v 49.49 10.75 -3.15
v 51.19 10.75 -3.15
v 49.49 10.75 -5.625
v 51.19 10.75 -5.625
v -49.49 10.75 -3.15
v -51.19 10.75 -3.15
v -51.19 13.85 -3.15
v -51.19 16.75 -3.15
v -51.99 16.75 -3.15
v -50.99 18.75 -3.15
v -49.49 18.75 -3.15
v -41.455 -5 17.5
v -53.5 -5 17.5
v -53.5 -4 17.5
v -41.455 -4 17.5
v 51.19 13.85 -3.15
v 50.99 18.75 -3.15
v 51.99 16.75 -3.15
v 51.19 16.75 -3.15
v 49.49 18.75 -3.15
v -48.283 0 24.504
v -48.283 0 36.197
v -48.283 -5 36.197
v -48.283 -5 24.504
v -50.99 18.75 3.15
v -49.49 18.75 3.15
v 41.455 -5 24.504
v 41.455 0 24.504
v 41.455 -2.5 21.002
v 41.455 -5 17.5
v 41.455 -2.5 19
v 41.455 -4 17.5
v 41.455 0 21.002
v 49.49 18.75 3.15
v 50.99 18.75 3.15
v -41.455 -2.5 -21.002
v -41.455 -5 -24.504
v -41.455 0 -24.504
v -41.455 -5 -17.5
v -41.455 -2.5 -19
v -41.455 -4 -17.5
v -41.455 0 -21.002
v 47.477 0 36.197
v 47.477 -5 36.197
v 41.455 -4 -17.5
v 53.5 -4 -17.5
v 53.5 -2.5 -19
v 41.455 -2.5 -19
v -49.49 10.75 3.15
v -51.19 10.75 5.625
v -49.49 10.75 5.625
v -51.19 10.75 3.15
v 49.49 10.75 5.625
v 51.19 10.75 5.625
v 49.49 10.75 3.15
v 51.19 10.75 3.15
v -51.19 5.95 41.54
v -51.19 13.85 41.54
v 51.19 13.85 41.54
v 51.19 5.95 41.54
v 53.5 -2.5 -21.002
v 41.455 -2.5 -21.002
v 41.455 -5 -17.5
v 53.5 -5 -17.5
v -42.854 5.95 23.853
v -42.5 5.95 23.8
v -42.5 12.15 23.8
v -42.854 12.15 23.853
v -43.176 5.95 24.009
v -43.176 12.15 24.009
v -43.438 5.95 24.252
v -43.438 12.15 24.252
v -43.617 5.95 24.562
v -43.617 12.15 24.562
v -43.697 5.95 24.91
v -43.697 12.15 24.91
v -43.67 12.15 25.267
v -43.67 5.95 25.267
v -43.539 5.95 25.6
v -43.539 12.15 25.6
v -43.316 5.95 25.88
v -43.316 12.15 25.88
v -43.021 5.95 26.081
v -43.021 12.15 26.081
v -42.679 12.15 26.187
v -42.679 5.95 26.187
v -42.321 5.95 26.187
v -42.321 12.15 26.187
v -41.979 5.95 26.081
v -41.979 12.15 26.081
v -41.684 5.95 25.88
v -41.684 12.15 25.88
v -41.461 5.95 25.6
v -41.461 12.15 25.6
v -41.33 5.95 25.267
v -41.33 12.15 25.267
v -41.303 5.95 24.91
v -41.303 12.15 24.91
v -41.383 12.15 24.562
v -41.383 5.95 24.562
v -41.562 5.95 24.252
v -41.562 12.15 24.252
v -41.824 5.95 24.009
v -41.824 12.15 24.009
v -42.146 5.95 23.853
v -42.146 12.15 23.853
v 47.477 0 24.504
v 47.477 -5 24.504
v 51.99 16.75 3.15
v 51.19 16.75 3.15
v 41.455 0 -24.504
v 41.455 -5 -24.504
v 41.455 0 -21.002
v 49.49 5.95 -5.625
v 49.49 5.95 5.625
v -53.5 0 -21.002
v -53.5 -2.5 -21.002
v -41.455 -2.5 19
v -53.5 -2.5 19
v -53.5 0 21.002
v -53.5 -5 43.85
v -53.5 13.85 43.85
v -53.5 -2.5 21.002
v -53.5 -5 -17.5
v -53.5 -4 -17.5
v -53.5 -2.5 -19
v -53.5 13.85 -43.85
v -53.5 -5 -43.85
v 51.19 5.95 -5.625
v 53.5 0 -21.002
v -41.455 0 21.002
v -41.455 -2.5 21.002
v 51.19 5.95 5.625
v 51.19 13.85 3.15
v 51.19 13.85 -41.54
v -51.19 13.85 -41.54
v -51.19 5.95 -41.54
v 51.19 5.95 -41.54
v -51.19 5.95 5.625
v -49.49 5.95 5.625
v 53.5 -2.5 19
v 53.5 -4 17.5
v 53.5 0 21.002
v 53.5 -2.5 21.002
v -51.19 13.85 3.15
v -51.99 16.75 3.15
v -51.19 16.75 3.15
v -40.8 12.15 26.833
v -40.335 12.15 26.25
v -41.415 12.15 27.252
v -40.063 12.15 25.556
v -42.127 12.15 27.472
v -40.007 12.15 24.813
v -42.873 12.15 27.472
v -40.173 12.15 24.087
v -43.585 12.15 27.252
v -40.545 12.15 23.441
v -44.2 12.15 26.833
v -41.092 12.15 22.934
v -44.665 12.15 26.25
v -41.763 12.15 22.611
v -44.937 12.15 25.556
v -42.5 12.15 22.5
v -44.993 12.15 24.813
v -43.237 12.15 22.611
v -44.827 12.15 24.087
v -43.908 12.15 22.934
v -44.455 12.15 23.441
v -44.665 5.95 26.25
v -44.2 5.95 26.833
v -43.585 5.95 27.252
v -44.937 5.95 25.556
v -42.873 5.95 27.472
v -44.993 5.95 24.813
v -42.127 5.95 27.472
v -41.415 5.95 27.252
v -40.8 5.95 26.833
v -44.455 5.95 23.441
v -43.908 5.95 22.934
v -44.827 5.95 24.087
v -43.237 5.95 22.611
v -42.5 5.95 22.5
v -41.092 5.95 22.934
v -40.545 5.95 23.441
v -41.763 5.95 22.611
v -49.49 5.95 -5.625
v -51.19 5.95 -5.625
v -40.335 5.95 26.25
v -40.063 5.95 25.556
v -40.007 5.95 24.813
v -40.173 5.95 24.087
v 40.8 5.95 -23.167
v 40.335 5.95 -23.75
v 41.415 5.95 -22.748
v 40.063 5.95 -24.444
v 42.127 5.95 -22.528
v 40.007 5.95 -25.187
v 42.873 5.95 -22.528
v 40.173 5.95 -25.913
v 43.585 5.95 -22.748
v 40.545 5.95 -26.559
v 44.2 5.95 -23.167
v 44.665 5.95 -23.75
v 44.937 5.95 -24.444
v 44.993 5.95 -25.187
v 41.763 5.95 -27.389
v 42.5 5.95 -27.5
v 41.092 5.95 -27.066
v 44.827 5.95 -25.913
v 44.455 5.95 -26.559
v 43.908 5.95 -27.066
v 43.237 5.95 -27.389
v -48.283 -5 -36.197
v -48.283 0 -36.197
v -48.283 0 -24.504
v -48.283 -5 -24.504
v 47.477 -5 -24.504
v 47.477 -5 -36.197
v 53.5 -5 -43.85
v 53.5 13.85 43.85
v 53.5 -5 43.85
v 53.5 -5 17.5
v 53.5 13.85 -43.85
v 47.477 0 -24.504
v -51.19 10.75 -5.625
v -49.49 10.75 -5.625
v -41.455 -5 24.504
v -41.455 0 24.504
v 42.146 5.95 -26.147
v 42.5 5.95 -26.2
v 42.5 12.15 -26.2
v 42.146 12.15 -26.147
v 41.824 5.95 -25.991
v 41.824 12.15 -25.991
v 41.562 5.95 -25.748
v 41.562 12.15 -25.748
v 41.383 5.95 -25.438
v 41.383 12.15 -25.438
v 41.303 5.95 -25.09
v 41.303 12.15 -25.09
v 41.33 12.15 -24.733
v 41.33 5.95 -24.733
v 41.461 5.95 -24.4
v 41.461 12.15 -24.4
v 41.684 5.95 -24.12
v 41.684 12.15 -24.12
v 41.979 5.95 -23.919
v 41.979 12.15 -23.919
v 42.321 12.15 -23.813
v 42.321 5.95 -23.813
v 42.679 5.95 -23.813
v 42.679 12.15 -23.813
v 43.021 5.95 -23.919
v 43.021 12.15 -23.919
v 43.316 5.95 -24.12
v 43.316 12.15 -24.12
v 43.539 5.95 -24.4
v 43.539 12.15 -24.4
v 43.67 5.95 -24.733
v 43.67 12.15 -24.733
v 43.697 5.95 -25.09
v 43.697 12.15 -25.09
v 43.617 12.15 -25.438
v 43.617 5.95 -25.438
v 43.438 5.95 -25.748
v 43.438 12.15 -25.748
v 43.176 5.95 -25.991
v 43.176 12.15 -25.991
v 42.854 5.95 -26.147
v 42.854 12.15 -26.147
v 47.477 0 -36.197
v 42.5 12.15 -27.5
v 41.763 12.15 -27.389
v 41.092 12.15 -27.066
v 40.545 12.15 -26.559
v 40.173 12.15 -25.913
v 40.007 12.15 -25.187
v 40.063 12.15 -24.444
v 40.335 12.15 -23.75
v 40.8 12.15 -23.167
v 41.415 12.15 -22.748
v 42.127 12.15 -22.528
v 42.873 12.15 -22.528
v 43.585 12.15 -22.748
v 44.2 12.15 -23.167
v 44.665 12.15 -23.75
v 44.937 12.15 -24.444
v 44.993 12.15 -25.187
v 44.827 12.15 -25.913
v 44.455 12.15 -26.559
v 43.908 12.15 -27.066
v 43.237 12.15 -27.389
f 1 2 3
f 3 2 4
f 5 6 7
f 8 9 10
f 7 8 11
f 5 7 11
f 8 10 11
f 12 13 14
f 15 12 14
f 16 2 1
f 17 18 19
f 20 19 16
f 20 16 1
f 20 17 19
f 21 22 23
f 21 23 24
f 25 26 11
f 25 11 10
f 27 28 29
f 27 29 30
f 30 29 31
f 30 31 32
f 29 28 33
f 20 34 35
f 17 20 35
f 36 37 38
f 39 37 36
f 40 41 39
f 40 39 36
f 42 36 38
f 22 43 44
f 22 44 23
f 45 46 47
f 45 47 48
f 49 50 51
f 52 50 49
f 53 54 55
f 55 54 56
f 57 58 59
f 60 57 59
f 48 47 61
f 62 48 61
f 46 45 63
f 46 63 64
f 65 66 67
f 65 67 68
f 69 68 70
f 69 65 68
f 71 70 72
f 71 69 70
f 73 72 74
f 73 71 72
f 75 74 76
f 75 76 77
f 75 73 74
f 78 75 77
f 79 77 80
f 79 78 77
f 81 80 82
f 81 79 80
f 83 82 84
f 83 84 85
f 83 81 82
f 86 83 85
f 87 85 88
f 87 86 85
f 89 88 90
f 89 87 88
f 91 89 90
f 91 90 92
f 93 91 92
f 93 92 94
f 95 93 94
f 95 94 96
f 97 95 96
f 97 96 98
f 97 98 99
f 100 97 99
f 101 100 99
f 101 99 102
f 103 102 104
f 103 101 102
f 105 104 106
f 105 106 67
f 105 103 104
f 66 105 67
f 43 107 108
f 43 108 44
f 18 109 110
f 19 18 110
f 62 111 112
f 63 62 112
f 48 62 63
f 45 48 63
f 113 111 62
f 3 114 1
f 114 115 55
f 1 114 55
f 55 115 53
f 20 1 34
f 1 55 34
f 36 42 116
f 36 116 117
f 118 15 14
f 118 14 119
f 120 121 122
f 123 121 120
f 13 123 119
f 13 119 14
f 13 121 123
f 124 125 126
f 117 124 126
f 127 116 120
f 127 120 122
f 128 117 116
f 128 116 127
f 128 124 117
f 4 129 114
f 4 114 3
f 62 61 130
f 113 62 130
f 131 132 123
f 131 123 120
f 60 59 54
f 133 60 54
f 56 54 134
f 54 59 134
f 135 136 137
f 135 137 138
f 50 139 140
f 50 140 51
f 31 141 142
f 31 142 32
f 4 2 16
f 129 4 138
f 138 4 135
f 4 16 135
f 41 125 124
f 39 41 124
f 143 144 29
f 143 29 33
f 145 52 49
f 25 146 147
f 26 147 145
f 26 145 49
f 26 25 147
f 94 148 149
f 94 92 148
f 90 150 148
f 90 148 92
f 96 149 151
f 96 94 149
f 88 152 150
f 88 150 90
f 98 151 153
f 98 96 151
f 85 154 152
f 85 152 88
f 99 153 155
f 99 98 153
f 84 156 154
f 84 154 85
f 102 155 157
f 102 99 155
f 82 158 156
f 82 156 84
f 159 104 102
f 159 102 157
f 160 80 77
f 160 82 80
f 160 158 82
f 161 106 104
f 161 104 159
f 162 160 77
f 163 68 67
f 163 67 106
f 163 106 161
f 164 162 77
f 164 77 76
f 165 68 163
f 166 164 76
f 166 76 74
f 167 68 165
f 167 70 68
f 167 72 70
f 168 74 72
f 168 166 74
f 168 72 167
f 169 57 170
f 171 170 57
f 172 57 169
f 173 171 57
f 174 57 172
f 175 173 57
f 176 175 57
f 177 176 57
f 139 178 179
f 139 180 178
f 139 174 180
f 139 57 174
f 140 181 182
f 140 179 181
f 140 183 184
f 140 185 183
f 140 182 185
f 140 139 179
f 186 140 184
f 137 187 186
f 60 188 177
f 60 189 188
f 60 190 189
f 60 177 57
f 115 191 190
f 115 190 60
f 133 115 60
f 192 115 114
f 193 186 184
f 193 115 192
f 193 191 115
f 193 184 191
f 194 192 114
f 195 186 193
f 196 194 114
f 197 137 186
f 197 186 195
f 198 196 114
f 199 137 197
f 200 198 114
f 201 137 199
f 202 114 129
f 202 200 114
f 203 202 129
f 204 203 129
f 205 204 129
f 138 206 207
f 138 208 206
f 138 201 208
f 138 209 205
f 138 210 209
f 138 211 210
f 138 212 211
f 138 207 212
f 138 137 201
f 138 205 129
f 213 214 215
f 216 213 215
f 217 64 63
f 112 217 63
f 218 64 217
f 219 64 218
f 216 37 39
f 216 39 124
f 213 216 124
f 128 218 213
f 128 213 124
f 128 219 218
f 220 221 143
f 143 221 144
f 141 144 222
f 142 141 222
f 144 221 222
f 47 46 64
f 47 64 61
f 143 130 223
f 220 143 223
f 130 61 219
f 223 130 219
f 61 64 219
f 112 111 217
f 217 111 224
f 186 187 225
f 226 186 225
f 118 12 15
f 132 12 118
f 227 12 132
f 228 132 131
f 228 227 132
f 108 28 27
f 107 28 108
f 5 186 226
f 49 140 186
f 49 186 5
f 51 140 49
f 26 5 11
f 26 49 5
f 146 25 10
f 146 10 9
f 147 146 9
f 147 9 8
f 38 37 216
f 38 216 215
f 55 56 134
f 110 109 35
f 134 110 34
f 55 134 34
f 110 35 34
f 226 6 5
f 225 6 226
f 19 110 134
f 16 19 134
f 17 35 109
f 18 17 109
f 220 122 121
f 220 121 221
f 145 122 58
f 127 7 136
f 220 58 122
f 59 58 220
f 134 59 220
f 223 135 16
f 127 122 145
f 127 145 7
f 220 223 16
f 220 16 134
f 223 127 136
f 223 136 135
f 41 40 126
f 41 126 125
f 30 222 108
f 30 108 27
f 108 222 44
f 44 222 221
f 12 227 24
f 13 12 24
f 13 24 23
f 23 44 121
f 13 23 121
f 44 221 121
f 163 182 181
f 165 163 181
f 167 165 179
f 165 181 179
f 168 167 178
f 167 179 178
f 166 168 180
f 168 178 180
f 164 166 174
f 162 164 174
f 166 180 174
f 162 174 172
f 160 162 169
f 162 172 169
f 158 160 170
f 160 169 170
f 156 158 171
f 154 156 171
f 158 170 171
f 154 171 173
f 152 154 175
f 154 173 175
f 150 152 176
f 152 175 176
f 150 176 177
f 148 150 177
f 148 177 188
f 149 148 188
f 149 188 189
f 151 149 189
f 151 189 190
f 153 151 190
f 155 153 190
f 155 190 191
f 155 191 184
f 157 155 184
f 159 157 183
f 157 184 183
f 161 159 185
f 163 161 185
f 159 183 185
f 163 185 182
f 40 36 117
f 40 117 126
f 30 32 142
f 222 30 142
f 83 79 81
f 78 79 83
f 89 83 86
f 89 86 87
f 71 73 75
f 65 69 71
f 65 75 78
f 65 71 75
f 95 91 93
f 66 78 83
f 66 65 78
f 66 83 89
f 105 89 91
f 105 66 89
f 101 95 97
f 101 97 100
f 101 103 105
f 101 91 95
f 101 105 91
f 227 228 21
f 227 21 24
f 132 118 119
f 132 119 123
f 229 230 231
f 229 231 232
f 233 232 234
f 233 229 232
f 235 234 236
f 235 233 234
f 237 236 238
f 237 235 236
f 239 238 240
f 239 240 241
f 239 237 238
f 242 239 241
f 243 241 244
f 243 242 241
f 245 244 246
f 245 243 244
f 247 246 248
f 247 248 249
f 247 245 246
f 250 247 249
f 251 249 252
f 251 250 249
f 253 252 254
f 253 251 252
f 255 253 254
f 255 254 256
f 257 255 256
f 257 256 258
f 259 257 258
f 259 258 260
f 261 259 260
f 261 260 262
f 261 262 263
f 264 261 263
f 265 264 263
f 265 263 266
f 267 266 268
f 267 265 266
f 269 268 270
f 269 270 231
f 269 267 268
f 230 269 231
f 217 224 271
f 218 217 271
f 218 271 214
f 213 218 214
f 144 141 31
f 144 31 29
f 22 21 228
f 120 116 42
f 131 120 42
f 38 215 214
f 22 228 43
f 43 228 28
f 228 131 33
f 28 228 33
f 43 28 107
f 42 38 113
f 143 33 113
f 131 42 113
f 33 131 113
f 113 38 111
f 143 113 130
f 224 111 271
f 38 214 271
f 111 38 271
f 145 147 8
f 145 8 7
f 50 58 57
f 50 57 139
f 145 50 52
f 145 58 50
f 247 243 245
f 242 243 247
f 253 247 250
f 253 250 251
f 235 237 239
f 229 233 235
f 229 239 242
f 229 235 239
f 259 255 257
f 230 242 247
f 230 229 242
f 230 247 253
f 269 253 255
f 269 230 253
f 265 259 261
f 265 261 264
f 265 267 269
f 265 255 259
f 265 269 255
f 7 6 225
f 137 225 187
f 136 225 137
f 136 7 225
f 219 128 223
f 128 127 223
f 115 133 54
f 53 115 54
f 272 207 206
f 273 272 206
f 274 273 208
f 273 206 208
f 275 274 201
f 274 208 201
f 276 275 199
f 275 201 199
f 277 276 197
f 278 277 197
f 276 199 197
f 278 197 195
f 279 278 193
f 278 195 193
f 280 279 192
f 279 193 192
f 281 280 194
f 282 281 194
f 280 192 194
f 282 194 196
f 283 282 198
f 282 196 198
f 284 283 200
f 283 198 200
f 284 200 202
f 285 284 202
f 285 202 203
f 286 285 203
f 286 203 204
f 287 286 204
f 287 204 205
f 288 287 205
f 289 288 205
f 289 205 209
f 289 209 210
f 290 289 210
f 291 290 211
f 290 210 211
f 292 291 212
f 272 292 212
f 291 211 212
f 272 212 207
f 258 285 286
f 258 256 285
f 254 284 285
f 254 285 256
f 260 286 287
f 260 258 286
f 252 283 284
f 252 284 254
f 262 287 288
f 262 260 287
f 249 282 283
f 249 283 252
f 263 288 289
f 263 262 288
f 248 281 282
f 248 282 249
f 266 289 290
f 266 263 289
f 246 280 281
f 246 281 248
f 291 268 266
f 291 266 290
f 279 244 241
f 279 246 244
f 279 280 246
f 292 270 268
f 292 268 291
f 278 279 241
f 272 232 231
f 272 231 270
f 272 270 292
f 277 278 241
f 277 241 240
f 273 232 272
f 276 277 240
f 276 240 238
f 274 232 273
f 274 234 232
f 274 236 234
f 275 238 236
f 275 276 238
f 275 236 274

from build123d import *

# Parameters (mm, degrees)
SKETCH1_W                = 107
SKETCH1_H                = 87.7
BOSS_EXTRUDE1_DEPTH      = 13.85
SKETCH2_W                = 102.38
SKETCH2_H                = 83.08
CUT_EXTRUDE1_DEPTH       = 7.9
SKETCH4_R                = 2.5
SKETCH4_R_2              = 1.2
BOSS_EXTRUDE2_DEPTH      = 6.2
SKETCH7_W                = 11.25
SKETCH7_H                = 4.8
BOSS_EXTRUDE3_DEPTH      = 1.7
BOSS_EXTRUDE4_DEPTH      = 3.15
SKETCH9_W                = 12.045425082
SKETCH9_H                = 7.003710523
BOSS_EXTRUDE9_DEPTH      = 5
SKETCH14_W               = 3.501855262
SKETCH14_H               = 2.5
CUT_EXTRUDE6_DEPTH       = 118.146852284
CHAMFER1_SIZE            = 1.5
CHAMFER1_OF_MIRROR4_SIZE = 1.5
MIRROR5_START            = -53.5
MIRROR5_DEPTH            = 12.045425082
BOSS_EXTRUDE10_DEPTH     = 5


# Read off the part's stored shape, not the designer's step: Mirror5
with BuildPart() as part:
    # Sketch1 → Boss-Extrude1 (new body)
    with BuildSketch(Plane(origin=(0, 0, 0), x_dir=(1, 0, 0), z_dir=(0, 1, 0))):
        Rectangle(SKETCH1_W, SKETCH1_H)
    extrude(amount=BOSS_EXTRUDE1_DEPTH)

    # Sketch2 → Cut-Extrude1 (cut)
    with BuildSketch(Plane(origin=(0, 13.85, 0), x_dir=(1, 0, 0), z_dir=(0, 1, 0))):
        Rectangle(SKETCH2_W, SKETCH2_H)
    extrude(amount=-CUT_EXTRUDE1_DEPTH, mode=Mode.SUBTRACT)

    # Sketch4 → Boss-Extrude2 (add)
    # profile 1 of 2: a face of its own
    with BuildSketch(Plane(origin=(0, 5.95, 0), x_dir=(1, 0, 0), z_dir=(0, 1, 0))):
        with Locations(Location((-42.5, -25, 0), (0, 0, 90))):
            Circle(SKETCH4_R)
        with Locations(Location((-42.5, -25, 0), (0, 0, 90))):
            Circle(SKETCH4_R_2, mode=Mode.SUBTRACT)
    # profile 2 of 2: a face of its own
    with BuildSketch(Plane(origin=(0, 5.95, 0), x_dir=(1, 0, 0), z_dir=(0, 1, 0))):
        with Locations(Location((42.5, 25, 0), (0, 0, 90))):
            Circle(SKETCH4_R)
        with Locations(Location((42.5, 25, 0), (0, 0, 90))):
            Circle(SKETCH4_R_2, mode=Mode.SUBTRACT)
    extrude(amount=BOSS_EXTRUDE2_DEPTH)

    # Sketch7 → Boss-Extrude3 (add)
    with BuildSketch(Plane(origin=(-51.19, 0, 0), x_dir=(0, 0, -1), z_dir=(1, 0, 0))):
        with Locations((0, 8.35)):
            Rectangle(SKETCH7_W, SKETCH7_H)
    boss_extrude3 = extrude(amount=BOSS_EXTRUDE3_DEPTH)

    # Sketch8 → Boss-Extrude4 (add, symmetric)
    with BuildSketch(Plane.XY):
        Polygon((-49.49, 10.75), (-49.49, 18.75), (-50.99, 18.75), (-51.99, 16.75), (-51.19, 16.75), (-51.19, 10.75), align=None)
    boss_extrude4 = extrude(amount=BOSS_EXTRUDE4_DEPTH, both=True)

    # Mirror1: Boss-Extrude3, Boss-Extrude4 across plane
    add(boss_extrude3.mirror(Plane(origin=(0, 0, 0), x_dir=(0, 0, 1), z_dir=(1, 0, 0))))
    add(boss_extrude4.mirror(Plane(origin=(0, 0, 0), x_dir=(0, 0, 1), z_dir=(1, 0, 0))))

    # Sketch9 → Boss-Extrude9 (add)
    with BuildSketch(Plane.XZ):
        with Locations((47.477287459, -21.001855262)):
            Rectangle(SKETCH9_W, SKETCH9_H)
    boss_extrude9 = extrude(amount=BOSS_EXTRUDE9_DEPTH)

    # Sketch14 → Cut-Extrude6 (cut, through all)
    with BuildSketch(Plane(origin=(53.5, 0, 0), x_dir=(0, 0, -1), z_dir=(1, 0, 0))):
        with Locations((19.250927631, -1.25)):
            Rectangle(SKETCH14_W, SKETCH14_H)
    cut_extrude6 = extrude(amount=-CUT_EXTRUDE6_DEPTH, mode=Mode.SUBTRACT)

    # Chamfer1
    chamfer1_edges = [part.edges().sort_by_distance(p)[0] for p in [
        (47.477287459, -2.5, -17.5),
    ]]
    chamfer(chamfer1_edges, length=CHAMFER1_SIZE)

    # Mirror4: Boss-Extrude9, Cut-Extrude6 across plane
    add(boss_extrude9.mirror(Plane.XY))
    add(cut_extrude6.mirror(Plane.XY), mode=Mode.SUBTRACT)

    # Chamfer1 of Mirror4
    chamfer1_of_mirror4_edges = [part.edges().sort_by_distance(p)[0] for p in [
        (47.477287459, -2.5, 17.5),
    ]]
    chamfer(chamfer1_of_mirror4_edges, length=CHAMFER1_OF_MIRROR4_SIZE)

    # Mirror5 outline → Mirror5 (add)
    with BuildSketch(Plane.YZ.offset(MIRROR5_START)):
        Polygon((-2.5, -19), (-4, -17.5), (-5, -17.5), (-5, -24.503710523), (0, -24.503710523), (0, -21.001855262), (-2.5, -21.001855262), align=None)
        Polygon((-2.5, 21.001855262), (0, 21.001855262), (0, 24.503710523), (-5, 24.503710523), (-5, 17.5), (-4, 17.5), (-2.5, 19), align=None)
    extrude(amount=MIRROR5_DEPTH)

    # Sketch15 → Boss-Extrude10 (add)
    with BuildSketch(Plane(origin=(0, 0, 0), x_dir=(-1, 0, 0), z_dir=(0, -1, 0))):
        Polygon((-47.477287459, 24.503710523), (-47.477287459, 36.197250384), (48.282556023, 36.197250384), (48.282556023, 24.503710523), (53.5, 24.503710523), (53.5, 43.85), (-53.5, 43.85), (-53.5, 24.503710523), align=None)
    boss_extrude10 = extrude(amount=BOSS_EXTRUDE10_DEPTH)

    # Mirror6: Boss-Extrude10 across plane
    add(boss_extrude10.mirror(Plane.XY))


solid = part.part
